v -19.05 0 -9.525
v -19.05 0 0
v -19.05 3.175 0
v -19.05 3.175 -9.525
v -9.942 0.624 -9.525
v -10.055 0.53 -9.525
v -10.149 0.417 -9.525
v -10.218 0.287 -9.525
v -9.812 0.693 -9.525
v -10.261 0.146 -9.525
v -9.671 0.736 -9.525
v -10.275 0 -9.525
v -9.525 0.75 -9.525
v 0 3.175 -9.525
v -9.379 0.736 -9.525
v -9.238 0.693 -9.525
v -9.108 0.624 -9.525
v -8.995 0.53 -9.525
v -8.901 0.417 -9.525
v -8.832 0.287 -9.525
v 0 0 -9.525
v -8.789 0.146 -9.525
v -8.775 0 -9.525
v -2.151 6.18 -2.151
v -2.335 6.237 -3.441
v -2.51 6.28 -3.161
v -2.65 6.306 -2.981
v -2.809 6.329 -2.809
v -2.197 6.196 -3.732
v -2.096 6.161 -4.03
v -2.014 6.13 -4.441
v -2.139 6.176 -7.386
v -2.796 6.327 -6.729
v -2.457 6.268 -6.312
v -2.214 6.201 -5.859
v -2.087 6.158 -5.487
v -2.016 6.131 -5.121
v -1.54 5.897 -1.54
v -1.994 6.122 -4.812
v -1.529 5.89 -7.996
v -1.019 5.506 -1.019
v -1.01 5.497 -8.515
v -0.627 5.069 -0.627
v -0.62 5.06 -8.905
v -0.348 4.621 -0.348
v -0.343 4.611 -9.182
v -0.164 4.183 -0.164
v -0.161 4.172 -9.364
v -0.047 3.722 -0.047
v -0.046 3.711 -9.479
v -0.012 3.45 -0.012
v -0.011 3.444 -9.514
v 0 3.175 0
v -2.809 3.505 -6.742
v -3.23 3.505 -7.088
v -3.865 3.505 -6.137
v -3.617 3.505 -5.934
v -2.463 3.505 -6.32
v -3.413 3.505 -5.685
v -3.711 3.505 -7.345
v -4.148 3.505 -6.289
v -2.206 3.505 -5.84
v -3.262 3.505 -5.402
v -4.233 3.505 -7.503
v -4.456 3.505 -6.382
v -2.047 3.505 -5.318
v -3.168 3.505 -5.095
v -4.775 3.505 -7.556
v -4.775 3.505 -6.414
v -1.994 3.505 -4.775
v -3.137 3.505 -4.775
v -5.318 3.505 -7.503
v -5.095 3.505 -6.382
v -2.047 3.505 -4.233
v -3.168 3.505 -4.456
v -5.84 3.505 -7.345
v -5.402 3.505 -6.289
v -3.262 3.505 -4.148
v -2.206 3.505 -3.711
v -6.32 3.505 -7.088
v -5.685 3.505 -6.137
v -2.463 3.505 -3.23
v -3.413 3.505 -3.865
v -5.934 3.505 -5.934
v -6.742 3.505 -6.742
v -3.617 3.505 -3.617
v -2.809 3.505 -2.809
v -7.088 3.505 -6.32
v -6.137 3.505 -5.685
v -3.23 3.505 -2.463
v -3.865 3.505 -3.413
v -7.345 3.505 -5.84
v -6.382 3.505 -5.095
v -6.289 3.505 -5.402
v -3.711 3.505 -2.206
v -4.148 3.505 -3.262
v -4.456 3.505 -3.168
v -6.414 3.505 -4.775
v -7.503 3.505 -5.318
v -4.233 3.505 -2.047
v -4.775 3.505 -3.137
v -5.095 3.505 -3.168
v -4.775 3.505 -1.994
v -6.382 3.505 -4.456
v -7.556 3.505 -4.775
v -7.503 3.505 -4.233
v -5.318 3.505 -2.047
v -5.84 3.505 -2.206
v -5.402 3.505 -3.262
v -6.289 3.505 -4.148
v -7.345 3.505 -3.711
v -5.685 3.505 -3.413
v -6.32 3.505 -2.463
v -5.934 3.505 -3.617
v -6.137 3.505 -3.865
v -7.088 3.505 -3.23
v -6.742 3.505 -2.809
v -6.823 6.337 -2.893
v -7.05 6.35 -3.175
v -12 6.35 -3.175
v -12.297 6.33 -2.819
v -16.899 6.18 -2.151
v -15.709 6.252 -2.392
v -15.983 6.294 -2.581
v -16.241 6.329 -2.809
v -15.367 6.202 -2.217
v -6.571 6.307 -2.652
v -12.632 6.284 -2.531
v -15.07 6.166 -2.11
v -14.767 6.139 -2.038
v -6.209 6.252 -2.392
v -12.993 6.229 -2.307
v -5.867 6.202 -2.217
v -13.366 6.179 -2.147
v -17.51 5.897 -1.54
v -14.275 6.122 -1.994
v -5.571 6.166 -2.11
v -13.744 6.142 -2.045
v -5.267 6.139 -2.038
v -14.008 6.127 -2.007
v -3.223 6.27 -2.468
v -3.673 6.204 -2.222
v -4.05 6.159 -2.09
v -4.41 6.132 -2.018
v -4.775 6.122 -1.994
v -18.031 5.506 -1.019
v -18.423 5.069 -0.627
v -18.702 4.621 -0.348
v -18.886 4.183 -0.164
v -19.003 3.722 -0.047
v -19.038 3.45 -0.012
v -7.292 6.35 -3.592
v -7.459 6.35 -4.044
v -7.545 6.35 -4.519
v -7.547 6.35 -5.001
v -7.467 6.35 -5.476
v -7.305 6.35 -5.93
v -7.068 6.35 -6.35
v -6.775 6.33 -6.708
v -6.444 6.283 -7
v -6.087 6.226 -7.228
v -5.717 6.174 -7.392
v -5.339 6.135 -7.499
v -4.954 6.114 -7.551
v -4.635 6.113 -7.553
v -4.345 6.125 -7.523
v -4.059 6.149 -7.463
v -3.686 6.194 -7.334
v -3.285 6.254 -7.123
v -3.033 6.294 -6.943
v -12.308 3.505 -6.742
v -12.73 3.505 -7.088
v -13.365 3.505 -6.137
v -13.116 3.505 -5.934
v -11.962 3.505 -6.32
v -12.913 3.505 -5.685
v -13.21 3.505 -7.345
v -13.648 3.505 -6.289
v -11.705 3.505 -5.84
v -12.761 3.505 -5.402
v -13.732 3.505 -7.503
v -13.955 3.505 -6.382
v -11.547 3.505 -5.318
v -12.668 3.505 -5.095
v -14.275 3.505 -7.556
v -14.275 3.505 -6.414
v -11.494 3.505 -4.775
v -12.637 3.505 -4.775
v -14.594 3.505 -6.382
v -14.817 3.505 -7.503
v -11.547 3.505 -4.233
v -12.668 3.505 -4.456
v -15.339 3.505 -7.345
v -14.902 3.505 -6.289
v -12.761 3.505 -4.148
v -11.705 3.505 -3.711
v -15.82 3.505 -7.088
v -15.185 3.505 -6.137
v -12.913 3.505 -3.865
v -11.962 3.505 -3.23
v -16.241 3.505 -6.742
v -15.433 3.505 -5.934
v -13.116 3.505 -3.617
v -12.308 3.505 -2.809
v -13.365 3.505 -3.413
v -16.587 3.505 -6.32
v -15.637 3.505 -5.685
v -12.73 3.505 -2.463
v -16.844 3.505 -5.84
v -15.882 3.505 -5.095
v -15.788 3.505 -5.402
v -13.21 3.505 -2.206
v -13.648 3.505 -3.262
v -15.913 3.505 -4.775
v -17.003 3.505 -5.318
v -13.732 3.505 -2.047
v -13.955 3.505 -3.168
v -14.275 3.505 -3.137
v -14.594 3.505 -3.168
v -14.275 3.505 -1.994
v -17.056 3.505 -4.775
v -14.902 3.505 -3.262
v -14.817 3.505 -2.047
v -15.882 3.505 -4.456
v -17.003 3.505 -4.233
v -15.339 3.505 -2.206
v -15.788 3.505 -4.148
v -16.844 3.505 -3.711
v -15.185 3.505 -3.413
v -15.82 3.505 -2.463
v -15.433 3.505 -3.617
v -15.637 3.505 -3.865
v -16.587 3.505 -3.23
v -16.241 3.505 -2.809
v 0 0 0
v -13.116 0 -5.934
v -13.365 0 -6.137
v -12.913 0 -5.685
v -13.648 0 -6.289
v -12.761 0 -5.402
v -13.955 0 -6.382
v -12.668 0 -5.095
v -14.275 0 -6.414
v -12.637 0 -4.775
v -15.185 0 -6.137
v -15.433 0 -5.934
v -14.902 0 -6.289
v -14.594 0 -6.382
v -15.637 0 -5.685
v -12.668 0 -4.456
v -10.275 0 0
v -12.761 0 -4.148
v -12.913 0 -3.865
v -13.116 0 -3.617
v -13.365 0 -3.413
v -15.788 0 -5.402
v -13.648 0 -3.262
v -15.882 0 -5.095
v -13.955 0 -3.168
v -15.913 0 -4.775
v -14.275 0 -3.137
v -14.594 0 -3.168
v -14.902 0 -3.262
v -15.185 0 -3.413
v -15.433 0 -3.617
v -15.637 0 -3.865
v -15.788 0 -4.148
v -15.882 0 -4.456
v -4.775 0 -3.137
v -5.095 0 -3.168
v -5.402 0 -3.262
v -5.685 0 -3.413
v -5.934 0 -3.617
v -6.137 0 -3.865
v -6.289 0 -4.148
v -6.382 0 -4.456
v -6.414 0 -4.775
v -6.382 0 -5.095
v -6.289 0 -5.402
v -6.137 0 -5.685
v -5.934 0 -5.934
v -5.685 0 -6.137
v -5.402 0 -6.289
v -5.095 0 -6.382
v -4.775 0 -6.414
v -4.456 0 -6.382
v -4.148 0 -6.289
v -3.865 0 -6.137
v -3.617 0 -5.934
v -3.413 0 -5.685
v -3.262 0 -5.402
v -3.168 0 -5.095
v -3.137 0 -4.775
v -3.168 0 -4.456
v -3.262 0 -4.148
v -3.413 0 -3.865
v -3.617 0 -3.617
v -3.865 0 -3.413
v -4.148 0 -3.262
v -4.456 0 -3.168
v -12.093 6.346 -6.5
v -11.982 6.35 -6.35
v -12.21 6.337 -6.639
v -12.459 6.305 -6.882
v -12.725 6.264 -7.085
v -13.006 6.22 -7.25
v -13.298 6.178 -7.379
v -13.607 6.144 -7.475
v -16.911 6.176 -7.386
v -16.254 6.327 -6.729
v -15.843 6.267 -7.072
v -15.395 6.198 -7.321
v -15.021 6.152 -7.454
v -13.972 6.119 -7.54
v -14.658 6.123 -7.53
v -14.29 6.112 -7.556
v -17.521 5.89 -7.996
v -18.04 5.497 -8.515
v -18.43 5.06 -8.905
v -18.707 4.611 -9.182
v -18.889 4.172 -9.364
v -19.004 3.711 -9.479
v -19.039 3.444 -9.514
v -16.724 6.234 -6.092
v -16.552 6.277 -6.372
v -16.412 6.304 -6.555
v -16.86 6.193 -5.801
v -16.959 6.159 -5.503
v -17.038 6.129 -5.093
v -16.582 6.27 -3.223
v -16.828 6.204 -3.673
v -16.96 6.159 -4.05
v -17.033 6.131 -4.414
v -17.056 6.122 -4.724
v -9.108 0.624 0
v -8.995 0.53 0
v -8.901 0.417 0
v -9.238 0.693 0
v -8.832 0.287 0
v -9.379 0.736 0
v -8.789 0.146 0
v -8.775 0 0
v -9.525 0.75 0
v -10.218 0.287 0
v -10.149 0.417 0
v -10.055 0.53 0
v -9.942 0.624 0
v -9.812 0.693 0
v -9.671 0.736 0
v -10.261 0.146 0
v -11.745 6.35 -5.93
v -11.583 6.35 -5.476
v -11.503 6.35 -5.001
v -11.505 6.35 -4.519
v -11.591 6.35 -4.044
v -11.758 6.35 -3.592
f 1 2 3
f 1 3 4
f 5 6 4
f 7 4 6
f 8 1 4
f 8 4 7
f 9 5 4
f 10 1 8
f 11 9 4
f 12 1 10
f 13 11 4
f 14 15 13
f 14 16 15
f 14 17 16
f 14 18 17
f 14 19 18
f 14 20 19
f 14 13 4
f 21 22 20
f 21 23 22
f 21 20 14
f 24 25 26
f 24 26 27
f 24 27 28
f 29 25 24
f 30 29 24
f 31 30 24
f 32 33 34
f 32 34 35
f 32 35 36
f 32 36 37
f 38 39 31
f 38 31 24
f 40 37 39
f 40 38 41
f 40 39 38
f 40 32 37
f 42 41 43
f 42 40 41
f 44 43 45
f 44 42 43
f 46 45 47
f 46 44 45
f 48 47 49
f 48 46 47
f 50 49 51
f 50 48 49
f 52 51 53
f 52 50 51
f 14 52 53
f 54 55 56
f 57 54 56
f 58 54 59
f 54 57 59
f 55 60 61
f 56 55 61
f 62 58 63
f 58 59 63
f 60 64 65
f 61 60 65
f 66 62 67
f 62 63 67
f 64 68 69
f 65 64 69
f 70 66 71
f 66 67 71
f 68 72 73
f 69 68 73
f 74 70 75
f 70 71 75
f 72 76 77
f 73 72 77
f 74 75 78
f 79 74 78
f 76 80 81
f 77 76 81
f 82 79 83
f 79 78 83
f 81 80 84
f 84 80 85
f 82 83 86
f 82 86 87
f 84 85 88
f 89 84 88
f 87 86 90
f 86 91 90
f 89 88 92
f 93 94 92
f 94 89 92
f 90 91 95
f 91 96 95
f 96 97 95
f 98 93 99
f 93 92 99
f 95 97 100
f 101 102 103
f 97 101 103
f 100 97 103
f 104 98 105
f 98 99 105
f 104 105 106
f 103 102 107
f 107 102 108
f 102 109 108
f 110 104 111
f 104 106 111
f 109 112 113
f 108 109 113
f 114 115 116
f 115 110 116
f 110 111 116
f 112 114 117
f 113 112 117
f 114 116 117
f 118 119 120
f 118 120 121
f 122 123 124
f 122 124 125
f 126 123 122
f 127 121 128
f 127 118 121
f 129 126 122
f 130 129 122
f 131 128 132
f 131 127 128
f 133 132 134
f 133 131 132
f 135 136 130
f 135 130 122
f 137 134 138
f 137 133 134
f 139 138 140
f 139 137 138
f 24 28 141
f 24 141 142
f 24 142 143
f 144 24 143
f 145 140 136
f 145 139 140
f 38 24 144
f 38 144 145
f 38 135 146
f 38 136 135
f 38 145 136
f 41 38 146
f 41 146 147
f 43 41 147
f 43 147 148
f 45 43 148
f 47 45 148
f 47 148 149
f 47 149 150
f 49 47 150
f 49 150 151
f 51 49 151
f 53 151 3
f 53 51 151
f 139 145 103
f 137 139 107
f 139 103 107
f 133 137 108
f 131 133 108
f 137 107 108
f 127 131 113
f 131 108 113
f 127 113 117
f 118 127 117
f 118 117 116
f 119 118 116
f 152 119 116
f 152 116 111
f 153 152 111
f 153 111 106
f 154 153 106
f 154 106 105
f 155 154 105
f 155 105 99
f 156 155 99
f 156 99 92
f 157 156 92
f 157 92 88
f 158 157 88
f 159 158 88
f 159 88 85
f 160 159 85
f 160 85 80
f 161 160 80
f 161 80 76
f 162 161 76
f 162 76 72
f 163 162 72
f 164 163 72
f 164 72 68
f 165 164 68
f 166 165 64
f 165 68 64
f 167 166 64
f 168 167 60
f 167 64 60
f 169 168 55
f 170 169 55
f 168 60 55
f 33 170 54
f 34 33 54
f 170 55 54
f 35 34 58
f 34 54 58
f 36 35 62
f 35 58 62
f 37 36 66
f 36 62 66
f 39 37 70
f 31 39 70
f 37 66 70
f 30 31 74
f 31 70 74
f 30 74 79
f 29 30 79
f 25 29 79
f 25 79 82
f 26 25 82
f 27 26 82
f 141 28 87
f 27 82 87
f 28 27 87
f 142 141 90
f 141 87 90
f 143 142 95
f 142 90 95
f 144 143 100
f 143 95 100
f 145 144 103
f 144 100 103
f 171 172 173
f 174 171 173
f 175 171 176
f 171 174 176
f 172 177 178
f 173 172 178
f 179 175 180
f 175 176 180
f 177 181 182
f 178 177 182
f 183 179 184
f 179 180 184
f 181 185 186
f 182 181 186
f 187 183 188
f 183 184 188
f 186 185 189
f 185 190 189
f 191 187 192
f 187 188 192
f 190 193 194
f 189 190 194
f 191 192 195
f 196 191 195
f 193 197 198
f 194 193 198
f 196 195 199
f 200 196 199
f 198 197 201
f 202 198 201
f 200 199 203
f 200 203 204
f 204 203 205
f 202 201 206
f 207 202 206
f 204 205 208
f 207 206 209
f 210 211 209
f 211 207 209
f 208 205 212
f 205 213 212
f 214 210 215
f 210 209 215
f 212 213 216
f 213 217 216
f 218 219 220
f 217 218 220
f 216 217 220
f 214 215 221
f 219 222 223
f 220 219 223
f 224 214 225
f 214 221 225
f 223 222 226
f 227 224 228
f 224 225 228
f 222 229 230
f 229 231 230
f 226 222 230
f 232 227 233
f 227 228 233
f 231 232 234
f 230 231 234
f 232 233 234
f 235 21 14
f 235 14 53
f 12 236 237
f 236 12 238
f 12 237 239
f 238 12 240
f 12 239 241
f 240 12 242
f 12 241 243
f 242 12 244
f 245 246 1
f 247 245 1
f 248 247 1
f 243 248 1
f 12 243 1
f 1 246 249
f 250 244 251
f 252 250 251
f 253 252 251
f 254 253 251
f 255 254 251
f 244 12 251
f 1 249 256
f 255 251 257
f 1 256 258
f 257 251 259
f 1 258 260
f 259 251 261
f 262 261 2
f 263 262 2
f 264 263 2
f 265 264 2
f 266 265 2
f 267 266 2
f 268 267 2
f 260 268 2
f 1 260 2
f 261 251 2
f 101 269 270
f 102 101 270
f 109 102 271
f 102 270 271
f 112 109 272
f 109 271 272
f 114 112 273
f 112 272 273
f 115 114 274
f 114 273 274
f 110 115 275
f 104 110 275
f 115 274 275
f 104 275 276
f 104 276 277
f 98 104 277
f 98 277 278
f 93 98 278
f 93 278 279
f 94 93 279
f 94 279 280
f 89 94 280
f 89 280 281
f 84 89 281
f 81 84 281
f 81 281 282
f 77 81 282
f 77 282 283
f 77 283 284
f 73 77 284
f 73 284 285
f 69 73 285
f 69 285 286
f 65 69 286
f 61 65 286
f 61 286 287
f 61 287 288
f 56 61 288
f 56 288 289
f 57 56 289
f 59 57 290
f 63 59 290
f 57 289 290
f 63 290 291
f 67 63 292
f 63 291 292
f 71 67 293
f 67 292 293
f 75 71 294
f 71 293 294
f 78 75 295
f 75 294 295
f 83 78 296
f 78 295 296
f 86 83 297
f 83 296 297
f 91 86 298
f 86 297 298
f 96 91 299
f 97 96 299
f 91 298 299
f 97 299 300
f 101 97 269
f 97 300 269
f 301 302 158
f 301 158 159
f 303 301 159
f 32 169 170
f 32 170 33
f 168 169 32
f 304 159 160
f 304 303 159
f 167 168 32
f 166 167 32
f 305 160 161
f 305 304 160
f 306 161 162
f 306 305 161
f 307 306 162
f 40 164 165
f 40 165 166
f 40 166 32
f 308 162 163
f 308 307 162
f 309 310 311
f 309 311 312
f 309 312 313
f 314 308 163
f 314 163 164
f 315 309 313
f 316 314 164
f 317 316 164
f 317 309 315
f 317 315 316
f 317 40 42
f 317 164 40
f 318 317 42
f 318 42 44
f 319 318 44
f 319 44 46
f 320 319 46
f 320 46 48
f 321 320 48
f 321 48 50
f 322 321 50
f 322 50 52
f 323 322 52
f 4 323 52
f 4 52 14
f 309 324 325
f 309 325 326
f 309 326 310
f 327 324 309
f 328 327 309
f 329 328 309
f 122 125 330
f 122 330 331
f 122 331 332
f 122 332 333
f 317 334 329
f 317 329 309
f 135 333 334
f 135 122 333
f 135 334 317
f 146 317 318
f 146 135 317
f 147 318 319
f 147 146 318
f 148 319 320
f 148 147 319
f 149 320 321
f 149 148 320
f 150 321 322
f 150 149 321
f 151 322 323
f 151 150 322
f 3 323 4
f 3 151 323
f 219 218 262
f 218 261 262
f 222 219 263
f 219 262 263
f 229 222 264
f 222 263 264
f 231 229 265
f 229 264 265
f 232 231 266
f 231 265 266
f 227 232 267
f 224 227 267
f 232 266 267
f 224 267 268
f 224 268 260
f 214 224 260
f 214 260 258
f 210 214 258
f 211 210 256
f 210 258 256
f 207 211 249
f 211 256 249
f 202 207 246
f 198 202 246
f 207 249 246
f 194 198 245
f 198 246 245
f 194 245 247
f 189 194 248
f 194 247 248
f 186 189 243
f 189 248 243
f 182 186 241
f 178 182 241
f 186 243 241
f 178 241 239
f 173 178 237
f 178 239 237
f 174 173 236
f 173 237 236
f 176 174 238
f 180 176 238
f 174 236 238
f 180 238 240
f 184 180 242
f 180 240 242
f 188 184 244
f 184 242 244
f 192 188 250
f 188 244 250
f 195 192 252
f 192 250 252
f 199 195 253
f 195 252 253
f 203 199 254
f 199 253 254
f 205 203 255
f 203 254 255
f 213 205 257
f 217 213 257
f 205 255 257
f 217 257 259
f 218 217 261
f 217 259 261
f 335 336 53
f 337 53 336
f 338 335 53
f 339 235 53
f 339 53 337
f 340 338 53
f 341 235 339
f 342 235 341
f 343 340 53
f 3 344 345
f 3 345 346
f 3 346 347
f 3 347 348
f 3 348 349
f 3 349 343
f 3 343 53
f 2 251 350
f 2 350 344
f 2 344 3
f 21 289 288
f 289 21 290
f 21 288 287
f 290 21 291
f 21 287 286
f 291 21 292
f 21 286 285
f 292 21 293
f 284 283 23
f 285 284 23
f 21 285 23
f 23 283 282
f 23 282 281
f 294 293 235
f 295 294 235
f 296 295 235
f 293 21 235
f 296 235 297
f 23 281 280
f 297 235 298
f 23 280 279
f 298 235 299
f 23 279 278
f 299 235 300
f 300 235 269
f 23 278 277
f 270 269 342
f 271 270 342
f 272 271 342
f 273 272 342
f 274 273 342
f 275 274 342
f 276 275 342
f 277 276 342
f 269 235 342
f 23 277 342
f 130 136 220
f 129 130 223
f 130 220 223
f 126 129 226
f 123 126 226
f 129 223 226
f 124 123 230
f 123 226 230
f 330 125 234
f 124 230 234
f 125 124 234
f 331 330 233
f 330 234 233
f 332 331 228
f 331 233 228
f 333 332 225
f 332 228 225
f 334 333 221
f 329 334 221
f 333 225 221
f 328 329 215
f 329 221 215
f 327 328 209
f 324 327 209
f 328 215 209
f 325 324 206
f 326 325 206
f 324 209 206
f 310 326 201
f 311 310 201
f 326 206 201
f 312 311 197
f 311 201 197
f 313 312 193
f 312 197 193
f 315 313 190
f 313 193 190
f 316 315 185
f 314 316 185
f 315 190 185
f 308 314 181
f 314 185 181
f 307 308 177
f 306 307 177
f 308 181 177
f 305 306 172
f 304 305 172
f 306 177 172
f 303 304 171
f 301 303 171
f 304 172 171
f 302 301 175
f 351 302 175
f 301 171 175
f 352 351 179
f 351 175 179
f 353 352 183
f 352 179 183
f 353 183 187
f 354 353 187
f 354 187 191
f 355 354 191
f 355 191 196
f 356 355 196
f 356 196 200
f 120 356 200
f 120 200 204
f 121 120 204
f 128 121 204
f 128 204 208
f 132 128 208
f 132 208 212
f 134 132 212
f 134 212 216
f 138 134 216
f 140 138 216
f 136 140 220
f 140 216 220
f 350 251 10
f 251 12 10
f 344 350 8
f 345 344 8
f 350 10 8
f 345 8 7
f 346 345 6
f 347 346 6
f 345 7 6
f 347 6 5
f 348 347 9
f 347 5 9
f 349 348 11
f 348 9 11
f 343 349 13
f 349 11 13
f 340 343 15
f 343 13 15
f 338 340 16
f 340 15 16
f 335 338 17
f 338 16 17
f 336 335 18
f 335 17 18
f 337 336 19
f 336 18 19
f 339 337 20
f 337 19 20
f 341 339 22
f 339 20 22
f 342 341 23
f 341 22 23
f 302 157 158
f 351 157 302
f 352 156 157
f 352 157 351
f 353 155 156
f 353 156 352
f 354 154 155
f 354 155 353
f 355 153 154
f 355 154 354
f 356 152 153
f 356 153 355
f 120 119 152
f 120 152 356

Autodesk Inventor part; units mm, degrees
ref_plane "YZ Plane" through (0, 0, 0) normal (1, 0, 0) x (0, 1, 0)
ref_plane "XZ Plane" through (0, 0, 0) normal (0, 1, 0) x (-1, 0, 0)
ref_plane "XY Plane" through (0, 0, 0) normal (0, 0, 1) x (1, 0, 0)
sketch "Sketch1" plane through (0, 0, 0) normal (0, 1, 0) x (-1, 0, 0)
  line L0 (0, 0) -> (19.05, 0)
  line L1 (19.05, 0) -> (19.05, -9.525)
  line L2 (19.05, -9.525) -> (0, -9.525)
  line L3 (0, -9.525) -> (0, 0)
  dimension "d0" = 19.05
  dimension "d1" = 9.525
extrude "Extrusion1" add sketch "Sketch1" along normal blind 6.35
sketch "Sketch2" plane through (-19.05, 0, 0) normal (0, 0, 1) x (1, 0, 0)
  line L0 (19.05, 0) -> (0, 0) projected
  point P0 (9.525, 0)
hole "Hole1" at (-9.525, 0, 0) direction (0, 0, -1) diameter 1.5 end through all
sketch "Sketch3" plane through (0, 6.35, 0) normal (0, 1, 0) x (1, 0, 0)
  line L0 (-19.05, 0) -> (-10.275, 0) projected
  line L1 (-19.05, 0) -> (-14.2748, 0)
  line L2 (-14.2748, 0) -> (-14.2748, 4.7752)
  line L3 (-14.2748, 4.7752) -> (-19.05, 4.7752)
  line L4 (-19.05, 4.7752) -> (-19.05, 0)
  line L5 (-19.05, 0) -> (0, 0) projected
  line L6 (0, 0) -> (-4.7752, 0)
  line L7 (-4.7752, 0) -> (-4.7752, 4.7752)
  line L8 (-4.7752, 4.7752) -> (0, 4.7752)
  line L9 (0, 4.7752) -> (0, 0)
  dimension "d11" = 4.7752
  dimension "d12" = 4.7752
  dimension "d13" = 4.7752
  dimension "d14" = 4.7752
hole "Hole2" at (-14.2748, 6.35, -4.7752) at (-4.7752, 6.35, -4.7752) direction (0, -1, 0) diameter 3.2766 end through all counterbore diameter 5.5626 counterbore depth 2.8448 clearance for "Socket Head Cap Screw" size "#4" standard "Ansi Unified Screw Threads"
sketch "Sketch4" plane through (0, 0, 0) normal (1, 0, 0) x (0, 0, -1)
  point P0 (0, 0)
fillet "Fillet1" radius 3.175 4 edges at (-9.525, 6.35, 0) (0, 6.35, -4.7625) (-9.525, 6.35, -9.525) (-19.05, 6.35, -4.7625)
properties part number "Top clamp for capillary jig - thermal seal"
